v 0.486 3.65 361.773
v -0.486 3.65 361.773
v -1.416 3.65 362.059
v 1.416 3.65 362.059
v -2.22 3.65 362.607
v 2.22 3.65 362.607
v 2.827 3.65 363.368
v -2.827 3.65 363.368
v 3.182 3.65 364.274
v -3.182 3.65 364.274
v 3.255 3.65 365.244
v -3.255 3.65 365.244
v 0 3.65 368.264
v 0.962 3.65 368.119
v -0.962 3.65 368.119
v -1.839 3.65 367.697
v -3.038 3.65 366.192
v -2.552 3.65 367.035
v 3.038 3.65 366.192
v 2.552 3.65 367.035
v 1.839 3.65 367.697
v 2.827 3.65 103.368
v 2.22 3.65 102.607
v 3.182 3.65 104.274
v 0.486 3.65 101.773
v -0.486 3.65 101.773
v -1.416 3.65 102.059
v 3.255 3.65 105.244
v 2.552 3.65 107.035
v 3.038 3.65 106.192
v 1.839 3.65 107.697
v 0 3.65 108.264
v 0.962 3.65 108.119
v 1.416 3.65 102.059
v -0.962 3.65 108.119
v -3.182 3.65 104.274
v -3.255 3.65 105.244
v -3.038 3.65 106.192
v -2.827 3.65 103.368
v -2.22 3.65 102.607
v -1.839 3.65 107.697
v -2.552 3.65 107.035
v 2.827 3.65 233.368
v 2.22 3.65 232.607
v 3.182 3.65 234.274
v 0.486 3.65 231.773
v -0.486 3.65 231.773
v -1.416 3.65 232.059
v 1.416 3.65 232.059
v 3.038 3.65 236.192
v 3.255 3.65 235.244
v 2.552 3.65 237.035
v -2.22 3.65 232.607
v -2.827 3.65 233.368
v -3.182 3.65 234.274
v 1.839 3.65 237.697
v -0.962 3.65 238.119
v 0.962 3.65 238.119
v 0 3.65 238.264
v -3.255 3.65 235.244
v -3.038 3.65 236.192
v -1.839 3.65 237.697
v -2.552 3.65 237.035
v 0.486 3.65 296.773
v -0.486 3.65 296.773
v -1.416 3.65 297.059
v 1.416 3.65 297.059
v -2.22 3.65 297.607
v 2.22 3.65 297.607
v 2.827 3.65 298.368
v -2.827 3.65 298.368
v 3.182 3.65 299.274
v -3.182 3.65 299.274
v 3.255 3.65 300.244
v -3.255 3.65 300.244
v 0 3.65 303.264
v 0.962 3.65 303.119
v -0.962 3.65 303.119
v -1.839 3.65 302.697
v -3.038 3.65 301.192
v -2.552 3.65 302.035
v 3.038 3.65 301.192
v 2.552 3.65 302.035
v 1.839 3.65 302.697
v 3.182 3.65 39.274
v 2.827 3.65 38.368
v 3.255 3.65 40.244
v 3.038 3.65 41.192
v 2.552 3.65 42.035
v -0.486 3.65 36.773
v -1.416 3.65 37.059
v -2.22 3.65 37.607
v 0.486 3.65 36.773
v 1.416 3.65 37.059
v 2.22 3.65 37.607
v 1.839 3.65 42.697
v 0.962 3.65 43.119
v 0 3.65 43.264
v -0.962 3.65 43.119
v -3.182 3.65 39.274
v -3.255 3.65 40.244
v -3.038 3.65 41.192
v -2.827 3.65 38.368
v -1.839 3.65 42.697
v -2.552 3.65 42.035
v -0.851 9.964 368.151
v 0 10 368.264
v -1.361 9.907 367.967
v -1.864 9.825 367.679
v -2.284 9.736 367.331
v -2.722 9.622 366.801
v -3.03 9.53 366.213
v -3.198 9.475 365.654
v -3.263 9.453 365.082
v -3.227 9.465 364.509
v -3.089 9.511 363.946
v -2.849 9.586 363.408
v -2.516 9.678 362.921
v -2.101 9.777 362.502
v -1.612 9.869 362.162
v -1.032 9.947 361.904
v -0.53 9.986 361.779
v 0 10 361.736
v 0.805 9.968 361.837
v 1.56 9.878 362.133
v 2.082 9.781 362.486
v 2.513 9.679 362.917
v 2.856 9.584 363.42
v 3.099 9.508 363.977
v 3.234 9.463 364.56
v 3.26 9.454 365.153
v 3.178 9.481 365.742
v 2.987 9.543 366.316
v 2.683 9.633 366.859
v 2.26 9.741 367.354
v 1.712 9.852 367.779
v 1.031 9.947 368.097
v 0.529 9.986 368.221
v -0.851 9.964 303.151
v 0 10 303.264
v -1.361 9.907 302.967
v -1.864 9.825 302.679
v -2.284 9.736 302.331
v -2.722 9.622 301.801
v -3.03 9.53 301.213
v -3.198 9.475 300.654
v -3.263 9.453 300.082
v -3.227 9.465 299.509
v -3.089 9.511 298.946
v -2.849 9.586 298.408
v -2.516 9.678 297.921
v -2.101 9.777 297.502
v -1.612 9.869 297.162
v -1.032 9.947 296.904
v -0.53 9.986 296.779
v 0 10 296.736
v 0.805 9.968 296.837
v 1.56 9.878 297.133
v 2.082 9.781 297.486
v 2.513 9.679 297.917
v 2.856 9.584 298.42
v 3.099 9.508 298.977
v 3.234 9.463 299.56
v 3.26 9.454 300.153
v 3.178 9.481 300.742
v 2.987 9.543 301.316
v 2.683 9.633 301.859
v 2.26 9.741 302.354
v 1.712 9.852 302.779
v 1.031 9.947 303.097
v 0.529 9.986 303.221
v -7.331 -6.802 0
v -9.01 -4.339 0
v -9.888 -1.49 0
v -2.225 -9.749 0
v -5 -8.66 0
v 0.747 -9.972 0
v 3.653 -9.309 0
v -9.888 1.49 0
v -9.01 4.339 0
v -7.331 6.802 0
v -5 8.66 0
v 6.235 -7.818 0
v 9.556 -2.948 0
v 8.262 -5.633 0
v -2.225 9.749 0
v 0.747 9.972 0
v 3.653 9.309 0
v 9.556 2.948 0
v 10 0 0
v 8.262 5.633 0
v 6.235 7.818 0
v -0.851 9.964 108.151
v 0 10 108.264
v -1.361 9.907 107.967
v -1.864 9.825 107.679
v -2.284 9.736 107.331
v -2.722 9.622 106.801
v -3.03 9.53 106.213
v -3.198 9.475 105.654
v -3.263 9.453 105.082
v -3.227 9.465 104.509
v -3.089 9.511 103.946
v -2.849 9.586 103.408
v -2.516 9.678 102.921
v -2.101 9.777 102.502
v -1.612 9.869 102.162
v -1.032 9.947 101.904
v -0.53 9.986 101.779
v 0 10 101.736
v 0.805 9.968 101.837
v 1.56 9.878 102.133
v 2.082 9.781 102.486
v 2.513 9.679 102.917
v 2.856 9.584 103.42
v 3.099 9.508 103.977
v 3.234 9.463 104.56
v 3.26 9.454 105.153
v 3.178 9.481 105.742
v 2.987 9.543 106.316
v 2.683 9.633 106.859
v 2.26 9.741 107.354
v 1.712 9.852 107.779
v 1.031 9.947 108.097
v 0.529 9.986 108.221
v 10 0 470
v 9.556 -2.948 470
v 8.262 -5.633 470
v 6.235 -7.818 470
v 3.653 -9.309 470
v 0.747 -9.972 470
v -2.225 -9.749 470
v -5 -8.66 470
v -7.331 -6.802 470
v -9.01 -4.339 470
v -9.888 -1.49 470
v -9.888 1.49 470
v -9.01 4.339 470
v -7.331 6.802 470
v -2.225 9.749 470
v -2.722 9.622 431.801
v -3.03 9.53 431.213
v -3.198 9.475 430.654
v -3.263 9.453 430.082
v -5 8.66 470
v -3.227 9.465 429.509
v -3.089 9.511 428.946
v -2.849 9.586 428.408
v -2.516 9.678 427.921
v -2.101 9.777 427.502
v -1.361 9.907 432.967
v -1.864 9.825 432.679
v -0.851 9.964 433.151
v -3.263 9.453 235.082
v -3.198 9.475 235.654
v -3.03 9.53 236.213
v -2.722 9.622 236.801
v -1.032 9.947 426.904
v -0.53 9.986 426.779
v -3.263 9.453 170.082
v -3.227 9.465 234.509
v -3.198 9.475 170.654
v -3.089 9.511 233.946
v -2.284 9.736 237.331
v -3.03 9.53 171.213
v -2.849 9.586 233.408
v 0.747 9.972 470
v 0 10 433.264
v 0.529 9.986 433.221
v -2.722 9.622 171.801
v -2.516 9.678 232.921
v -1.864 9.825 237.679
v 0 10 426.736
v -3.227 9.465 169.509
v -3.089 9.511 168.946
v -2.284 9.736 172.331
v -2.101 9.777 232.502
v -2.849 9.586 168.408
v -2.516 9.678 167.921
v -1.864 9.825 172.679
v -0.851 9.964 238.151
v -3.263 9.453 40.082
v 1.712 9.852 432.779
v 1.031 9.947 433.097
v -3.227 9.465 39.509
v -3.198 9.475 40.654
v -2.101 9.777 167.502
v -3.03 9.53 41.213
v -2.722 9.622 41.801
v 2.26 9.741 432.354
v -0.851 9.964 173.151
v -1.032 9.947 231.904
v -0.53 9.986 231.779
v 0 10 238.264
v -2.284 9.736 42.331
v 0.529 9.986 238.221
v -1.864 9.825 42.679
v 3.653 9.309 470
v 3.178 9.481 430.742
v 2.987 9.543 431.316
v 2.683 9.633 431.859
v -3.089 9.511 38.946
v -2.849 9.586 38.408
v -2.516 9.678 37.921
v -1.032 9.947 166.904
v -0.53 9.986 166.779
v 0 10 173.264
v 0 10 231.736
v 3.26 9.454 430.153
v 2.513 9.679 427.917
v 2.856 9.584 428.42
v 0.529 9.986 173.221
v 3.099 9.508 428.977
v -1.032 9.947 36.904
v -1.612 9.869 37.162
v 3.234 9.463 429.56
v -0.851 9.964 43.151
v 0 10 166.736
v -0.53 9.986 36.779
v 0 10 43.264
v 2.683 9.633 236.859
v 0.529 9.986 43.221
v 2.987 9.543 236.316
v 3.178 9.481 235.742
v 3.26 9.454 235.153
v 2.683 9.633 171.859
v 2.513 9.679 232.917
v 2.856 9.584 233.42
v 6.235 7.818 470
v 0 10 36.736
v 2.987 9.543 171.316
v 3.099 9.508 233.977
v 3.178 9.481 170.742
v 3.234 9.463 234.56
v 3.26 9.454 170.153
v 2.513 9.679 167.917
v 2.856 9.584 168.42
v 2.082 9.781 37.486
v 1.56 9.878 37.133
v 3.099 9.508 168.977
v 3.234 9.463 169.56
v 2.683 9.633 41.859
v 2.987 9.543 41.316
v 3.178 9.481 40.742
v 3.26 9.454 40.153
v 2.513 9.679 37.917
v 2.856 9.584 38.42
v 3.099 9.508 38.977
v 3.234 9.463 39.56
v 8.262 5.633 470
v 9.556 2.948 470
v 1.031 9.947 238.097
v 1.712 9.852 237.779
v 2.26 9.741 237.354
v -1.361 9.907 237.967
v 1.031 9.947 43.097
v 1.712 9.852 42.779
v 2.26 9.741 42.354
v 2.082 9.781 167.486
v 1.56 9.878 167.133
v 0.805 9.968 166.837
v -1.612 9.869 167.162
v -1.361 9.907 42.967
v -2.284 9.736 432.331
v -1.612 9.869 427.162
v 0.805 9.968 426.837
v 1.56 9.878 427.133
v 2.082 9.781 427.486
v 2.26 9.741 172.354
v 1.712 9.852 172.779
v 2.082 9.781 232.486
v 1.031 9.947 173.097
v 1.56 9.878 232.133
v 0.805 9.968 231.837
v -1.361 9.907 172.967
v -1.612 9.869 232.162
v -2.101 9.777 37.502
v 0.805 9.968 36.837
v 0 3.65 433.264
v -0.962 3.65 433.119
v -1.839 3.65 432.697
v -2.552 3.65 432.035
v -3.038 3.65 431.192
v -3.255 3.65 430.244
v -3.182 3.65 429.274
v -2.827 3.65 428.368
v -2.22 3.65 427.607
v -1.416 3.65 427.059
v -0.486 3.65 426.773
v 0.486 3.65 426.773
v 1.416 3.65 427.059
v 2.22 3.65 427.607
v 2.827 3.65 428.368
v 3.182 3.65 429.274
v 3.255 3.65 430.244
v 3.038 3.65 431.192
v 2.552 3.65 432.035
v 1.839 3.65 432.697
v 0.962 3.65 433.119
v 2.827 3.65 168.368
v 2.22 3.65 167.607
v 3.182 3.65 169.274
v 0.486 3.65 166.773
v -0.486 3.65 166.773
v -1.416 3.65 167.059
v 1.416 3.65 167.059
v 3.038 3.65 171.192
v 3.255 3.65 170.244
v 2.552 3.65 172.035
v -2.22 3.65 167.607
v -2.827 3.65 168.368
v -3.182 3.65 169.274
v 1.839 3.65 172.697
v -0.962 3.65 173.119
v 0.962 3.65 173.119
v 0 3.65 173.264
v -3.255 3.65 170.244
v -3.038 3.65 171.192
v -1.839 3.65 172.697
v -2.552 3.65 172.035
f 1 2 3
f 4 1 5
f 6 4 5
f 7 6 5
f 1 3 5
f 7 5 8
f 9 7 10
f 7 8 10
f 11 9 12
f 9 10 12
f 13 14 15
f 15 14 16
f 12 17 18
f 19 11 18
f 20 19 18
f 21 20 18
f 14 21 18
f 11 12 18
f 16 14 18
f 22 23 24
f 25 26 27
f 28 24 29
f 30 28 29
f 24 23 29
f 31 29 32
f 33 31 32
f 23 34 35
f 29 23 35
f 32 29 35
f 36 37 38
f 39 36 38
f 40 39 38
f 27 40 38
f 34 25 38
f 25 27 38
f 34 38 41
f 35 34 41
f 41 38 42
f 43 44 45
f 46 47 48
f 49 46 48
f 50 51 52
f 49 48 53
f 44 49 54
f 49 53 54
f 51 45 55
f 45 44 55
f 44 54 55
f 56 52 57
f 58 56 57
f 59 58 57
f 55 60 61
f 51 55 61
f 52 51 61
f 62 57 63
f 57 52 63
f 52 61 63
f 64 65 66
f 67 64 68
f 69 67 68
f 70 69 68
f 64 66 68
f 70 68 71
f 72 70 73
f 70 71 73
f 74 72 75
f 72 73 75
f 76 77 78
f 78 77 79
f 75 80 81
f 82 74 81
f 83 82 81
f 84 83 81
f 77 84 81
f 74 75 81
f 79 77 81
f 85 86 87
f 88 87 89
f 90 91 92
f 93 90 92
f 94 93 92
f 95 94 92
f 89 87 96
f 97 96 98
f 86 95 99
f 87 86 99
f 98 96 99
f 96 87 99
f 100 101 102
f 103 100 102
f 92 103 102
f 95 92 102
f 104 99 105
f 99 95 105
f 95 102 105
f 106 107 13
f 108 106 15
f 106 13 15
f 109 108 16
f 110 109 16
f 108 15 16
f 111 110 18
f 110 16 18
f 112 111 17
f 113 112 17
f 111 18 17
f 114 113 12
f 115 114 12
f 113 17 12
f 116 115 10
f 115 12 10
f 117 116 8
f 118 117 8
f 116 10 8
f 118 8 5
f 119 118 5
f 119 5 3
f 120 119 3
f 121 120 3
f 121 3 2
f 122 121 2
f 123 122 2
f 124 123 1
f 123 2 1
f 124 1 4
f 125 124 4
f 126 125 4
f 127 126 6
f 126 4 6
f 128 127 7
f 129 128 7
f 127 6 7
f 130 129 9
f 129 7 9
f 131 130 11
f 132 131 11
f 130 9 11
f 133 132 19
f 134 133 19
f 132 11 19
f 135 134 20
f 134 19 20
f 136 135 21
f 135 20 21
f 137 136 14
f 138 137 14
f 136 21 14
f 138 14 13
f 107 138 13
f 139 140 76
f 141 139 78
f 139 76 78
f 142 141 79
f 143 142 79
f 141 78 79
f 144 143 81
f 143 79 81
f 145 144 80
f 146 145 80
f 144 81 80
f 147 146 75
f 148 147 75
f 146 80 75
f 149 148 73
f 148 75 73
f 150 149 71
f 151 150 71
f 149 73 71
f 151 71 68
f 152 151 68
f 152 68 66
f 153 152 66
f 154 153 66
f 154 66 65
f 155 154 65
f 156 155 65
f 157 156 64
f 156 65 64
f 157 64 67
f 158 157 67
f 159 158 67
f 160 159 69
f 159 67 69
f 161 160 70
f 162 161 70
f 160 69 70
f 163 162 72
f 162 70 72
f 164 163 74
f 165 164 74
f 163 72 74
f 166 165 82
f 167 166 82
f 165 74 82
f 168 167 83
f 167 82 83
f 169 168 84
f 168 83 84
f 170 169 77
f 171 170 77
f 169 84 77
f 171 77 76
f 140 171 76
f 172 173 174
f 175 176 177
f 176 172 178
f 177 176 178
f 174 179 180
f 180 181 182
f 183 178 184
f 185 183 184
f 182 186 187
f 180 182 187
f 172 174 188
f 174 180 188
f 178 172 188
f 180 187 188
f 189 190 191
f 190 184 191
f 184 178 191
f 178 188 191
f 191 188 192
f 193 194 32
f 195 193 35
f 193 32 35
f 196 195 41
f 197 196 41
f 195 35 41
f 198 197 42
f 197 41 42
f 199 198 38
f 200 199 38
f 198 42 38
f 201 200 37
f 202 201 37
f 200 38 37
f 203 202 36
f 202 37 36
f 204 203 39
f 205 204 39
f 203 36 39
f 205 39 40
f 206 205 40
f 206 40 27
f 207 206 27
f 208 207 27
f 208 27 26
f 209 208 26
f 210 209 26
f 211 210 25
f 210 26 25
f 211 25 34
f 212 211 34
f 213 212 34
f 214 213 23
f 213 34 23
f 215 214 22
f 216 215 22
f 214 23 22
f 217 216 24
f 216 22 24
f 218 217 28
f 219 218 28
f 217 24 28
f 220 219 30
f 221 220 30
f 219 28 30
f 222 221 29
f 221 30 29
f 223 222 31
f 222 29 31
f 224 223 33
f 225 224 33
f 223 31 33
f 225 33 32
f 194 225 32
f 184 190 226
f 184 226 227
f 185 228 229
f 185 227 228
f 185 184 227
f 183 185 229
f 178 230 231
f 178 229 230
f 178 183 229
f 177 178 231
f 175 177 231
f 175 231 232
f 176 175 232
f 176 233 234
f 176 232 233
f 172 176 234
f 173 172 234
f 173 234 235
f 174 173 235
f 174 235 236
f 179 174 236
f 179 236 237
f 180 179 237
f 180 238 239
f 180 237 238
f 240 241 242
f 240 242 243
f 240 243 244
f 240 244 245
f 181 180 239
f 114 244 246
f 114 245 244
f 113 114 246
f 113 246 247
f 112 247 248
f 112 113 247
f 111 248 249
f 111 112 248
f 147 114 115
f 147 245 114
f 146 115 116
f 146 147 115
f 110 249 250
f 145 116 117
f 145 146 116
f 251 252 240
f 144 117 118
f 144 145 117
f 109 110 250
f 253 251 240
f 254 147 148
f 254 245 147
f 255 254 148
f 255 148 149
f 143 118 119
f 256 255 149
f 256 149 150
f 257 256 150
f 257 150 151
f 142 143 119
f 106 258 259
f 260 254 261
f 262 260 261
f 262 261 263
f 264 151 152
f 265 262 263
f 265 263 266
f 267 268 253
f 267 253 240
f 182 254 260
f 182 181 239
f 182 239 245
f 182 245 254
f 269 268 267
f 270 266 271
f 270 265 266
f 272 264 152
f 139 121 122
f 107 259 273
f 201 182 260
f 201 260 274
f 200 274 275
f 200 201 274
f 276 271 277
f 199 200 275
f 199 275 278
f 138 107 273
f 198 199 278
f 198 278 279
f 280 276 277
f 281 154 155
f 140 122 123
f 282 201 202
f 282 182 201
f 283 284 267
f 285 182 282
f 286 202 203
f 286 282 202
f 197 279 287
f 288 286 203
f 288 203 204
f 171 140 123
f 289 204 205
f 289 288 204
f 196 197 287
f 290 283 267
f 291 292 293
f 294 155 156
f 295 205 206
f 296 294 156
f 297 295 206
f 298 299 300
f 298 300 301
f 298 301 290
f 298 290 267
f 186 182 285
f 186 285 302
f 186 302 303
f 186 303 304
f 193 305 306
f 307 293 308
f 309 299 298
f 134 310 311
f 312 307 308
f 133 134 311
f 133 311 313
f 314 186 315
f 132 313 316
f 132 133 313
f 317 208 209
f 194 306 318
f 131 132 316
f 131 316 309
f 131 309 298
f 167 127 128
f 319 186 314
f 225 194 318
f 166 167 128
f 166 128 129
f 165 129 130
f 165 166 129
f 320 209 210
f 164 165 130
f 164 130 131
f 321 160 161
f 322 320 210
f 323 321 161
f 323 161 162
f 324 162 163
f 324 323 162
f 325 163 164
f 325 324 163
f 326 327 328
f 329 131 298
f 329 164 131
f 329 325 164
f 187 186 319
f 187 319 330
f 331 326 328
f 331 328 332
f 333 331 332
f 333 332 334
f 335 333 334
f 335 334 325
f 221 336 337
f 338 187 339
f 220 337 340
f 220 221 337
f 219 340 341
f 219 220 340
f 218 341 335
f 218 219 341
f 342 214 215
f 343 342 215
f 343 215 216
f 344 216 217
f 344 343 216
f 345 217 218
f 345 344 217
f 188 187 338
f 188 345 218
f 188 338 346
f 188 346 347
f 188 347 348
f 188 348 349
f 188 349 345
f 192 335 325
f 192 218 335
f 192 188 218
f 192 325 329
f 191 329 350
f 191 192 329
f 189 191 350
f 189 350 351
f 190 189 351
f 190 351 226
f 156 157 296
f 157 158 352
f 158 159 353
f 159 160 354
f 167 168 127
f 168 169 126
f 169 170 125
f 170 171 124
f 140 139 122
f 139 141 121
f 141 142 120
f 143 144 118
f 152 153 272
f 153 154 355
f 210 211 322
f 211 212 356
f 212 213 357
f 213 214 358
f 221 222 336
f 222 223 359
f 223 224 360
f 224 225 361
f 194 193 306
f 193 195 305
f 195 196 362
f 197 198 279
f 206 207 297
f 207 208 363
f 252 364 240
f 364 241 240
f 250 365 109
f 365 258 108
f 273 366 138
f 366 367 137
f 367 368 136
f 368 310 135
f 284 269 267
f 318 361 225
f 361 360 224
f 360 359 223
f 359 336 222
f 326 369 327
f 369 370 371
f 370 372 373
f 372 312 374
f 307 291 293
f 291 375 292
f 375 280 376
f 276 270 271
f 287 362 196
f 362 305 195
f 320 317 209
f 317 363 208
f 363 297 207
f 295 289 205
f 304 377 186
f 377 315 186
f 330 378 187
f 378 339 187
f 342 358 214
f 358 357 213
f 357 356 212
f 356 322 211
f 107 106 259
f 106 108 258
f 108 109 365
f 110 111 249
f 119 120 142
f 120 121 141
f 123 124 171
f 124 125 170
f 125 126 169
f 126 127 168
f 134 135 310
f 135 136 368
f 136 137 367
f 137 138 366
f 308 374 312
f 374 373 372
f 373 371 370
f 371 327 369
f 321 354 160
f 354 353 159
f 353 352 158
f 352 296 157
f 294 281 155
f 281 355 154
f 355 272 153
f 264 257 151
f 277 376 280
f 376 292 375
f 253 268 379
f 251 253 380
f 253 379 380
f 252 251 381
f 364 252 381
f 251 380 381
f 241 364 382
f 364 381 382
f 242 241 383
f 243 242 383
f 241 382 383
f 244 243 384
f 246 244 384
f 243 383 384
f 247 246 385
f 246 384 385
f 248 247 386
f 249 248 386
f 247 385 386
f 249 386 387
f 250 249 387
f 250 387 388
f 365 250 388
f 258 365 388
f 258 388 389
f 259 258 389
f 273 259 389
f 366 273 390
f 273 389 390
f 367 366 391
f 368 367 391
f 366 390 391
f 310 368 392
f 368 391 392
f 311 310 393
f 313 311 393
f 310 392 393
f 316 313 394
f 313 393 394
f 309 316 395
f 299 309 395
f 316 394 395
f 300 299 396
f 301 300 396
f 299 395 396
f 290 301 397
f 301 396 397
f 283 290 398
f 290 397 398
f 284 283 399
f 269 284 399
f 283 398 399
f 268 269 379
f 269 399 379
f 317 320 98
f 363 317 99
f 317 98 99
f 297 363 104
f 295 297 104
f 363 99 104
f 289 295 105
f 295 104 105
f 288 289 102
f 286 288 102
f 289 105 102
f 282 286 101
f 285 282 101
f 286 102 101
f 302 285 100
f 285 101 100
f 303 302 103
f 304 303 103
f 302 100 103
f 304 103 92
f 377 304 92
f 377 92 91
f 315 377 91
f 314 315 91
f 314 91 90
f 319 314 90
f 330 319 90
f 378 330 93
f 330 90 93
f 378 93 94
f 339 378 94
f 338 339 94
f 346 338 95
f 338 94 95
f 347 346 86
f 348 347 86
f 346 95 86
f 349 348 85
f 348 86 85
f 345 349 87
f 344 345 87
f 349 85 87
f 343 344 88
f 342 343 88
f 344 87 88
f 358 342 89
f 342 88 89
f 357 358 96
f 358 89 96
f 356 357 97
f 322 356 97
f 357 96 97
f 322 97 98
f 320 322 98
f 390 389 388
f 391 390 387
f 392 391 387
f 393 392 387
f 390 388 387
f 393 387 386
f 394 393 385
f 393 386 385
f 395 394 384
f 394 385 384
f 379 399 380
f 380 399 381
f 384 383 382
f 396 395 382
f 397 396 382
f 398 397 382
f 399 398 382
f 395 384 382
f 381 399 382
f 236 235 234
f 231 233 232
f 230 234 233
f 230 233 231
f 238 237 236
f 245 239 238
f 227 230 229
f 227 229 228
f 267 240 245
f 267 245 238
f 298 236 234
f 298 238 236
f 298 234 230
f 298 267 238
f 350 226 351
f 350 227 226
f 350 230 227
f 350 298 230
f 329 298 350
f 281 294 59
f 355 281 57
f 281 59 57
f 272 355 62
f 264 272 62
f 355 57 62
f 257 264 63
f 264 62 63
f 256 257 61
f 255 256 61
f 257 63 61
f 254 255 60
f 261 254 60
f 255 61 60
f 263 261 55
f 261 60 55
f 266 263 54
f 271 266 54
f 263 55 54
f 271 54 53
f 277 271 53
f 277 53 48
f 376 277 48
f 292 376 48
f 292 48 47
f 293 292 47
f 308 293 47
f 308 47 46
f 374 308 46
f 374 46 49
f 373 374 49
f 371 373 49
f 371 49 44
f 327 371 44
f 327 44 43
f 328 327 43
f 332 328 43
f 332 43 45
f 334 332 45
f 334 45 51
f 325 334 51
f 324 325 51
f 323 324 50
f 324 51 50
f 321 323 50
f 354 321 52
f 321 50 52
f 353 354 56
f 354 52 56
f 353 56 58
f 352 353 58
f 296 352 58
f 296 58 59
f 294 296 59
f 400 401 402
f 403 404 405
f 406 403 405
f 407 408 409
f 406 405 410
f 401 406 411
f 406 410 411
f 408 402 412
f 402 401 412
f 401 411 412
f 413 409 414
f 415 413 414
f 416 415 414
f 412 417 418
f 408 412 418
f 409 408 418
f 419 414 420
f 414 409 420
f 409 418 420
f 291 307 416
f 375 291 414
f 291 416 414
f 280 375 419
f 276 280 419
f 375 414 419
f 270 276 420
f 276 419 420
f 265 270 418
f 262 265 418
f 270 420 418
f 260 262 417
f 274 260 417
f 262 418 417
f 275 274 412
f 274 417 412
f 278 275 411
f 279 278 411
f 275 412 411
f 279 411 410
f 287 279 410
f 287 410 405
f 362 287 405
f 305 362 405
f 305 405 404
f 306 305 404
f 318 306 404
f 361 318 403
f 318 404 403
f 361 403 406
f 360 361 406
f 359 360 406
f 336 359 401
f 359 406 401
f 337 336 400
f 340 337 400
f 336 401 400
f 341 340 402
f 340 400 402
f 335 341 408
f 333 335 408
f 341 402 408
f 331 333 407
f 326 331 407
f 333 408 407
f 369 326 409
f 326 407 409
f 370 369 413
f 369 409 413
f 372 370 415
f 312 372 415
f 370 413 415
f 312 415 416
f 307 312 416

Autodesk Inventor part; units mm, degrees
ref_plane "YZ Plane" through (0, 0, 0) normal (1, 0, 0) x (0, 1, 0)
ref_plane "XZ Plane" through (0, 0, 0) normal (0, 1, 0) x (-1, 0, 0)
sketch "Sketch1" plane through (0, 0, 0) normal (0, 0, 1) x (1, 0, 0)
  circle A0 centre (0, 0) radius 10
  dimension "d0" = 20
extrude "Extrusion1" add sketch "Sketch1" along normal blind 470
sketch "Sketch2" plane through (0, 0, 470) normal (0, 0, 1) x (1, 0, 0)
  circle A0 centre (0, 0) radius 10 projected
  point P0 (0, 10)
ref_plane "Work Plane1" through (0, 10, 470) normal (0, 1, 0) x (-1, 0, 0)
sketch "Sketch3" plane through (0, 10, 470) normal (0, 1, 0) x (-1, 0, 0)
  line L0 (10, 0) -> (-10, 0) projected
  line L1 (0, 0) -> (0, -7.8686) construction
  point P0 (0, -470)
  point P1 (0, -40)
  point P2 (0, -105)
  point P3 (0, -170)
  point P4 (0, -235)
  point P5 (0, -300)
  point P6 (0, -365)
  point P7 (0, -430)
  dimension "d3" = 40
  dimension "d6" = 65
  dimension "d18" = 40
hole "Hole1" at (0, 10, 430) at (0, 10, 365) at (0, 10, 300) at (0, 10, 235) at (0, 10, 170) at (0, 10, 105) at (0, 10, 40) direction (0, -1, 0) diameter 6.5278 depth 6.35
properties part number "diy-rail_470mm"
